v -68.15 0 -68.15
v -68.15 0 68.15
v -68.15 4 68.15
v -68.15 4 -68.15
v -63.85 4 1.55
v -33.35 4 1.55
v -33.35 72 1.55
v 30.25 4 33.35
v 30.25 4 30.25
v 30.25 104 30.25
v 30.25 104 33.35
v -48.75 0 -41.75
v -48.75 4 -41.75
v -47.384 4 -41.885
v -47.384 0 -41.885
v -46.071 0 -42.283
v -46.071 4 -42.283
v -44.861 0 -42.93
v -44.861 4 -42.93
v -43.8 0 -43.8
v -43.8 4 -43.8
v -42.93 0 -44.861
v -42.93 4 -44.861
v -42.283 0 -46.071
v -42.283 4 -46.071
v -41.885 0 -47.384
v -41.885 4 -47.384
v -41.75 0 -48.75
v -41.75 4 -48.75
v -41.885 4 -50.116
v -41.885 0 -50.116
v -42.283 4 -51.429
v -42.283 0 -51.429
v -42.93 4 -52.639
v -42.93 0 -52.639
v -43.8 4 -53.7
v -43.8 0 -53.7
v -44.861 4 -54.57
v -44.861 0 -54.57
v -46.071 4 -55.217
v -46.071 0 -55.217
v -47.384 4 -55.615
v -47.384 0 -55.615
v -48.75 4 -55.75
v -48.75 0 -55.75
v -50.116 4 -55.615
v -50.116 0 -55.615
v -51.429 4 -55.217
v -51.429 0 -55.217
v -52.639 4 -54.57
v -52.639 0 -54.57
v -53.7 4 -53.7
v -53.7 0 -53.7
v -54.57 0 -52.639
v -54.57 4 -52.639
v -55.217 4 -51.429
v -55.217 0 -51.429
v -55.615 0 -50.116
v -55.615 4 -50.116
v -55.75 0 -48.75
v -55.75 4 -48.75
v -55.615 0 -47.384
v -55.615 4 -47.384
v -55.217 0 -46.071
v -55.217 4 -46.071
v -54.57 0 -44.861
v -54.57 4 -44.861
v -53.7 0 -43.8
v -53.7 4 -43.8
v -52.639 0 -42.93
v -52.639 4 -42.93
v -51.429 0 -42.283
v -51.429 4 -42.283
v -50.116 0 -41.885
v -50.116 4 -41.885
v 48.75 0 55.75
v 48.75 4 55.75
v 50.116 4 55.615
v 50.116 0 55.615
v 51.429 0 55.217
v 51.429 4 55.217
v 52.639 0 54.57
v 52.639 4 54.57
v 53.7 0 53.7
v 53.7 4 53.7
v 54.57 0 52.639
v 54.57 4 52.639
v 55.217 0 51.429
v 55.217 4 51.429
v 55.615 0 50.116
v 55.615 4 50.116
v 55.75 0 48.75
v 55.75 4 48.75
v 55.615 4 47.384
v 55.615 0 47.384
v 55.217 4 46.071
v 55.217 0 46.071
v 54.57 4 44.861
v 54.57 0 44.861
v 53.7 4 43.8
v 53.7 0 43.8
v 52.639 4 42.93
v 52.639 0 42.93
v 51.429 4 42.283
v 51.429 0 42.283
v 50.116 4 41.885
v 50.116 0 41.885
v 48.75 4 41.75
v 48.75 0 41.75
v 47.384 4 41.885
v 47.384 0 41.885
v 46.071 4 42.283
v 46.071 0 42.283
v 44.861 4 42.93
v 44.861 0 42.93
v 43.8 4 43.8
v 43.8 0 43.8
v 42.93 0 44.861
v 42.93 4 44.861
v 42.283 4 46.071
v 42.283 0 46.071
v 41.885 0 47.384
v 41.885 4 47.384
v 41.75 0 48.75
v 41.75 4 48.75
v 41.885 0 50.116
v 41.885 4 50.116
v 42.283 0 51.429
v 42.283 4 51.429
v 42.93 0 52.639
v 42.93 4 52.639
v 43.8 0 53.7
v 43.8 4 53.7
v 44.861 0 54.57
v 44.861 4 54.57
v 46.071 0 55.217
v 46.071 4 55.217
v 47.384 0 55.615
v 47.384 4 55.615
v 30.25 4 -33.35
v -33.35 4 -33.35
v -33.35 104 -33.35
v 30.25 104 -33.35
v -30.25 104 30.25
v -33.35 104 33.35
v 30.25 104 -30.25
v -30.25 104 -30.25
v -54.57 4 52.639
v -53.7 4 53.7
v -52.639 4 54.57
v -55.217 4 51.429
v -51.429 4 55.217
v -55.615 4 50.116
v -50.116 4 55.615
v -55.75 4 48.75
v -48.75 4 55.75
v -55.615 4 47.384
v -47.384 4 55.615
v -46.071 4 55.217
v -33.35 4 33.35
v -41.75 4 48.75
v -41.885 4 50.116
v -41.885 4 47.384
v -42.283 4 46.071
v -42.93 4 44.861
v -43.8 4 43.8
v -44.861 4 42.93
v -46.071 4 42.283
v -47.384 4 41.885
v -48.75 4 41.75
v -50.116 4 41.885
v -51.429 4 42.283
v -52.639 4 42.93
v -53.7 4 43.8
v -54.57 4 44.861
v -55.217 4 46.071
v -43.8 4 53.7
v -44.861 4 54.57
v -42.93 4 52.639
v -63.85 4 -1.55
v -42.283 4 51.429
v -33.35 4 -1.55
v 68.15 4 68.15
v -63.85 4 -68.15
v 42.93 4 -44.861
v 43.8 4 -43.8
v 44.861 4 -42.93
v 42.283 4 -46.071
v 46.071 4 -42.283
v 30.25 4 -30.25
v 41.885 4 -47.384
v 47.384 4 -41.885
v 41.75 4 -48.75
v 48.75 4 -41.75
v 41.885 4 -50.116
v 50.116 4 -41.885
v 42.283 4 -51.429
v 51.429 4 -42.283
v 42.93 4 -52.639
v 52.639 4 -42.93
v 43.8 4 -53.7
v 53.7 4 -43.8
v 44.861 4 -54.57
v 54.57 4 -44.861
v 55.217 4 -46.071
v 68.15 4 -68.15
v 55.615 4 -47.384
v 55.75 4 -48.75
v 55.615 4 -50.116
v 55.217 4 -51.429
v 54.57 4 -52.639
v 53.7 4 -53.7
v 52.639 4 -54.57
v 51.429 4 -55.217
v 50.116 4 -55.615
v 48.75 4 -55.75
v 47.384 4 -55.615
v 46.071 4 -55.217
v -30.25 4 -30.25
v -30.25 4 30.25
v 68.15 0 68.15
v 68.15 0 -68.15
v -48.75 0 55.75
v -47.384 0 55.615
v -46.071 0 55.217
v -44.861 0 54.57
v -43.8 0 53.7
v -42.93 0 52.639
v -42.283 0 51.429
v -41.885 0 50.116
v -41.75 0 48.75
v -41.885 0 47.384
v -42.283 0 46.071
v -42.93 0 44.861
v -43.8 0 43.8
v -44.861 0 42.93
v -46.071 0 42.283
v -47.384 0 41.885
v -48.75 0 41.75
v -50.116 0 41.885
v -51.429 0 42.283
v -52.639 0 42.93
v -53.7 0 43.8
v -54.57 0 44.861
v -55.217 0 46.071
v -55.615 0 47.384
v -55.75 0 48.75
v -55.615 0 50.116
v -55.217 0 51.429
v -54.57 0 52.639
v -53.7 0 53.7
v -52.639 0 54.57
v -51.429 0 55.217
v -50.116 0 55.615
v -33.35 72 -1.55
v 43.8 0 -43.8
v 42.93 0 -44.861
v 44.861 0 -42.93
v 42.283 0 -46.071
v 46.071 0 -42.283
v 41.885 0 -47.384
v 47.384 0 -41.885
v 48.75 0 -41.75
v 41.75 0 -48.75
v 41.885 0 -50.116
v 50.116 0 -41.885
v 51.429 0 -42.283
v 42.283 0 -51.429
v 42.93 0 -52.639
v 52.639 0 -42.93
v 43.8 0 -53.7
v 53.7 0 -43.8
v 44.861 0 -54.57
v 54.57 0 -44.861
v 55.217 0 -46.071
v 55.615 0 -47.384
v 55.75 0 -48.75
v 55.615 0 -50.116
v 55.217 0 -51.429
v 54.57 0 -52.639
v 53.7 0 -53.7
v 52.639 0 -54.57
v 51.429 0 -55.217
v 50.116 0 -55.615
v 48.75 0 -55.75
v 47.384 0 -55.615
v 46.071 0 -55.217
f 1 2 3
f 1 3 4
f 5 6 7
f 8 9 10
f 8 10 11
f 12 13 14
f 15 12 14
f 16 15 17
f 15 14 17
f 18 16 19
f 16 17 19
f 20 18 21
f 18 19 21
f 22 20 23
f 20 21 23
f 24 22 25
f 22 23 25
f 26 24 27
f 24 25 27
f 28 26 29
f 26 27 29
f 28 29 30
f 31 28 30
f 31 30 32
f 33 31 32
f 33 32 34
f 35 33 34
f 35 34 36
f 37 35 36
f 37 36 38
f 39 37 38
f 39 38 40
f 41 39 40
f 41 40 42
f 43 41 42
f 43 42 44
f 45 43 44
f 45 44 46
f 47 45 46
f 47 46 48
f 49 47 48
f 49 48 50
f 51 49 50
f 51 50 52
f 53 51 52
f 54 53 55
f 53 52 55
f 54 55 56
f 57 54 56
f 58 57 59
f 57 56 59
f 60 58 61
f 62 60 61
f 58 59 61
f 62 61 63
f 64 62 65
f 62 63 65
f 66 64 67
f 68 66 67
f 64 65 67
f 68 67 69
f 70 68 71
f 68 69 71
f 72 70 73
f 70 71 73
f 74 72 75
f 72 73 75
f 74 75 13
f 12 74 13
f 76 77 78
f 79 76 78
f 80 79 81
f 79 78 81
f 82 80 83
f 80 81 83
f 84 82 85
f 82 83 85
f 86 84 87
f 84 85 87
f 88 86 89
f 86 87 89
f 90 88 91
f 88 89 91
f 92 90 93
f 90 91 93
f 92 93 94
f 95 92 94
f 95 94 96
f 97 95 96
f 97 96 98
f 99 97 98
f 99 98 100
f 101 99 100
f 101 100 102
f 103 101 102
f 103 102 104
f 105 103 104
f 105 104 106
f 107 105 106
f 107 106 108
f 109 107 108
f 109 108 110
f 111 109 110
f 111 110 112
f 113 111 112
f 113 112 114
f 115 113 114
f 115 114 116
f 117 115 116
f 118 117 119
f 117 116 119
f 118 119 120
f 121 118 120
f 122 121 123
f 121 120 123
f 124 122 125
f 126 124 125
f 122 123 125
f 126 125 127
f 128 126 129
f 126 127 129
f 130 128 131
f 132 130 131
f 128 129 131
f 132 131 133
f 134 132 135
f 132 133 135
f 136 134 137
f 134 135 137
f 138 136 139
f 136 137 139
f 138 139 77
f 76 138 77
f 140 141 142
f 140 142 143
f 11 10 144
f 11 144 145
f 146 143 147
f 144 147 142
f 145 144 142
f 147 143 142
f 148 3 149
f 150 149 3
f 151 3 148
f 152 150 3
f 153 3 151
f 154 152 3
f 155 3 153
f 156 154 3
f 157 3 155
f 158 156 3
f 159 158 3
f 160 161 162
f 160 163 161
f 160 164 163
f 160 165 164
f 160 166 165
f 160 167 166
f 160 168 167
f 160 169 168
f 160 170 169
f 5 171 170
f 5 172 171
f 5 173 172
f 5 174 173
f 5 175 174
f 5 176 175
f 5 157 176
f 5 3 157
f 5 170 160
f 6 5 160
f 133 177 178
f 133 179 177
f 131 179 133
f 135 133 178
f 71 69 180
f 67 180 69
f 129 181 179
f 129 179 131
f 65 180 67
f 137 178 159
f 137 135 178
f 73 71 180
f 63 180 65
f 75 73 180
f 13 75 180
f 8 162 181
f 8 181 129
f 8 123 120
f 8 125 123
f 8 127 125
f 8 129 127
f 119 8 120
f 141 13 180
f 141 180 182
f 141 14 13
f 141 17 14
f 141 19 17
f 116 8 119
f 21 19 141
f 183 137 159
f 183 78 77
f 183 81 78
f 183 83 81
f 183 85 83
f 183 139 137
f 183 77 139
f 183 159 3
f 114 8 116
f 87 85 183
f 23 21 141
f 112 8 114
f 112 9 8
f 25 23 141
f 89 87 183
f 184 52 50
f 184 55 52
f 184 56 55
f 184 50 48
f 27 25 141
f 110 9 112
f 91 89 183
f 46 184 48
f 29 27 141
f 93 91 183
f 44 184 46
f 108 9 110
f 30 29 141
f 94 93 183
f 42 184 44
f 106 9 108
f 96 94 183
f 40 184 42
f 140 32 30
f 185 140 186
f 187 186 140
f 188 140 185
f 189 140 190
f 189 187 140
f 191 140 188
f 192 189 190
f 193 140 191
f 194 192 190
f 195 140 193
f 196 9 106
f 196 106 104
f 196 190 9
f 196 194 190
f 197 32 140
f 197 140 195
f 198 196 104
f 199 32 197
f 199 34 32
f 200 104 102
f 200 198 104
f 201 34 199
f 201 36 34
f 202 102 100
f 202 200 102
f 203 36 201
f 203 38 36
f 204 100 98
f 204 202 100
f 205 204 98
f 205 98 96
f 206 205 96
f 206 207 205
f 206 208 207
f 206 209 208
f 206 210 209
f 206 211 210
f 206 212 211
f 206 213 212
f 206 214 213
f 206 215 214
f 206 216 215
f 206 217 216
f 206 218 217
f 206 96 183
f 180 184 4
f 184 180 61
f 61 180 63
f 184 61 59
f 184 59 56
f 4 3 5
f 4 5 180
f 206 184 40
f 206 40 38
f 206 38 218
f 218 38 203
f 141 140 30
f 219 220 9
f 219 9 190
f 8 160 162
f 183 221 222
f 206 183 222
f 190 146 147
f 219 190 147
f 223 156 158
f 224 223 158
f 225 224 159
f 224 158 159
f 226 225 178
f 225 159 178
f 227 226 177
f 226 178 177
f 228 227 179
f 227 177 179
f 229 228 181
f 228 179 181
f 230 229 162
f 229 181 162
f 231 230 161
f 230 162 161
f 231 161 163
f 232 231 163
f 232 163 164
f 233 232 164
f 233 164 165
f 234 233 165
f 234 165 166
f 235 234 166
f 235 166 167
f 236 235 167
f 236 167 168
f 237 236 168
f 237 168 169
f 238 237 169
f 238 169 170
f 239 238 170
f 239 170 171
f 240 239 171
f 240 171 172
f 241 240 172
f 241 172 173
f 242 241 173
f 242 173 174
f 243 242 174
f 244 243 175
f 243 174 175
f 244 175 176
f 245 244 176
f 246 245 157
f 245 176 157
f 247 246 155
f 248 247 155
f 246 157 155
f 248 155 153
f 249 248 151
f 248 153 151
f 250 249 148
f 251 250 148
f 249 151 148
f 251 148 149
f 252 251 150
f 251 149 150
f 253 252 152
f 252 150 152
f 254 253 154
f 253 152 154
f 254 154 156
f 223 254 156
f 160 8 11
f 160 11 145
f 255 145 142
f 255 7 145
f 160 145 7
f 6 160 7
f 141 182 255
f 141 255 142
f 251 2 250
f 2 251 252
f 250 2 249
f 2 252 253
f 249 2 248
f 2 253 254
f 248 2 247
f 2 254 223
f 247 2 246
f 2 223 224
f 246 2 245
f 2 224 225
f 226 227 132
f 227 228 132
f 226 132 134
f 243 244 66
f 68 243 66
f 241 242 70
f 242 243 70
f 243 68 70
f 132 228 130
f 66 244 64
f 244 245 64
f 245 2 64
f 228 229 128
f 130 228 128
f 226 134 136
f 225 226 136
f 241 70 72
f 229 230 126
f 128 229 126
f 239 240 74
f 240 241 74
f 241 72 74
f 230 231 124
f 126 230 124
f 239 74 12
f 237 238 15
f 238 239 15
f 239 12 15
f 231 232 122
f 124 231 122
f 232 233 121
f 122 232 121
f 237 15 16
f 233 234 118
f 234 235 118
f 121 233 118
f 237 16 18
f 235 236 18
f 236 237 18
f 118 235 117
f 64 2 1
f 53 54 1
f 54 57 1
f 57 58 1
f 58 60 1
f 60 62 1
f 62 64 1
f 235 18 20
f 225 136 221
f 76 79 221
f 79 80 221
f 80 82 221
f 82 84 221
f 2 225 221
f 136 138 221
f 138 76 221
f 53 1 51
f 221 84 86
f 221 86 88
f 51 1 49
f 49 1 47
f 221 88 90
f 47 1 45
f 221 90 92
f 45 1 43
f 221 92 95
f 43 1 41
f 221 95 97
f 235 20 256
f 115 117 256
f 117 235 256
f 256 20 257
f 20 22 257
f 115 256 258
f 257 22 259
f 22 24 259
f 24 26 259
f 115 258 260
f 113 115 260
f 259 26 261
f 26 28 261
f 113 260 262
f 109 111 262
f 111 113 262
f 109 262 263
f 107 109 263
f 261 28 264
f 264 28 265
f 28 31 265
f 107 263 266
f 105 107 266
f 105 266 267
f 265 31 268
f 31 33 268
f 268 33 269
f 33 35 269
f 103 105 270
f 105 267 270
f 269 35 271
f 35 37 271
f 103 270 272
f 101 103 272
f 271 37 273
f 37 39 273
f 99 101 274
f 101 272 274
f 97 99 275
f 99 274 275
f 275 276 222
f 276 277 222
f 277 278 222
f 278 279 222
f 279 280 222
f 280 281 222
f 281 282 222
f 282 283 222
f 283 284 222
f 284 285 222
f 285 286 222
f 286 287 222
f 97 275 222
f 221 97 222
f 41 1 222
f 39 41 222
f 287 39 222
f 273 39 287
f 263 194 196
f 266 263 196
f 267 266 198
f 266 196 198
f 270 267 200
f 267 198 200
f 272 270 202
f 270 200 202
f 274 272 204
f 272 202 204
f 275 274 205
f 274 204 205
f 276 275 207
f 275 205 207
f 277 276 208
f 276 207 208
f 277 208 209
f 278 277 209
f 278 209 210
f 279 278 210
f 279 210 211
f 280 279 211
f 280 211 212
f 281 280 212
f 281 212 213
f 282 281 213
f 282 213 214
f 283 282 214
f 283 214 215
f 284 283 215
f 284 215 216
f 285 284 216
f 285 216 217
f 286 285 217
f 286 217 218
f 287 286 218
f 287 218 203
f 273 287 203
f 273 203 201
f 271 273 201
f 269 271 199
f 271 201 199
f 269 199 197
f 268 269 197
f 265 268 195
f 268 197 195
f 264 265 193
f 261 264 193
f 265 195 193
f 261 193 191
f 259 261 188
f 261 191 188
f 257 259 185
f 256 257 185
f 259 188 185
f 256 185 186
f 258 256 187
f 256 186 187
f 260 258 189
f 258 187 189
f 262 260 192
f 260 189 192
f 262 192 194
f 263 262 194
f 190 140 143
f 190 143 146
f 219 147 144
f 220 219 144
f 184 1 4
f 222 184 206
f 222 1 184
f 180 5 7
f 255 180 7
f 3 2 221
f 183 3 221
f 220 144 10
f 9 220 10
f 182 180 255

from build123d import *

# Parameters (mm, degrees)
SKETCH_1_W          = 136.3
SKETCH_1_H          = 136.3
EXTRUDE_1_DEPTH     = 4
EXTRUDE_2_DEPTH     = 100
CUT_EXTRUDE_1_DEPTH = 100
SKETCH_5_R          = 7
CUT_EXTRUDE_2_DEPTH = 100


with BuildPart() as part:
    # 草图1 → 凸台-拉伸1 (new body)
    with BuildSketch(Plane(origin=(0, 0, 0), x_dir=(1, 0, 0), z_dir=(0, 1, 0))):
        Rectangle(SKETCH_1_W, SKETCH_1_H)
    extrude(amount=EXTRUDE_1_DEPTH)

    # 草图2 → 凸台-拉伸2 (add)
    with BuildSketch(Plane(origin=(0, 4, 0), x_dir=(1, 0, 0), z_dir=(0, 1, 0))):
        Polygon((30.25, 30.25), (-30.25, 30.25), (-30.25, -30.25), (30.25, -30.25), (30.25, -33.35), (-33.35, -33.35), (-33.35, -1.55), (-63.85, -1.55), (-63.85, 1.55), (-33.35, 1.55), (-33.35, 33.35), (30.25, 33.35), align=None)
    extrude(amount=EXTRUDE_2_DEPTH)

    # 草图3 → 切除-拉伸1 (cut)
    with BuildSketch(Plane.XY.offset(1.55)):
        Polygon((-63.85, 4), (-33.35, 72), (-33.35, 104), (-63.85, 104), align=None)
    extrude(amount=-CUT_EXTRUDE_1_DEPTH, mode=Mode.SUBTRACT)

    # 草图5 → 切除-拉伸2 (cut)
    with BuildSketch(Plane(origin=(0, 4, 0), x_dir=(1, 0, 0), z_dir=(0, 1, 0))):
        with Locations(Location((48.75, 48.75, 0), (0, 0, 270))):
            Circle(SKETCH_5_R)
        with Locations(Location((48.75, -48.75, 0), (0, 0, 270))):
            Circle(SKETCH_5_R)
        with Locations(Location((-48.75, -48.75, 0), (0, 0, 270))):
            Circle(SKETCH_5_R)
        with Locations(Location((-48.75, 48.75, 0), (0, 0, 270))):
            Circle(SKETCH_5_R)
    extrude(amount=-CUT_EXTRUDE_2_DEPTH, mode=Mode.SUBTRACT)


solid = part.part
